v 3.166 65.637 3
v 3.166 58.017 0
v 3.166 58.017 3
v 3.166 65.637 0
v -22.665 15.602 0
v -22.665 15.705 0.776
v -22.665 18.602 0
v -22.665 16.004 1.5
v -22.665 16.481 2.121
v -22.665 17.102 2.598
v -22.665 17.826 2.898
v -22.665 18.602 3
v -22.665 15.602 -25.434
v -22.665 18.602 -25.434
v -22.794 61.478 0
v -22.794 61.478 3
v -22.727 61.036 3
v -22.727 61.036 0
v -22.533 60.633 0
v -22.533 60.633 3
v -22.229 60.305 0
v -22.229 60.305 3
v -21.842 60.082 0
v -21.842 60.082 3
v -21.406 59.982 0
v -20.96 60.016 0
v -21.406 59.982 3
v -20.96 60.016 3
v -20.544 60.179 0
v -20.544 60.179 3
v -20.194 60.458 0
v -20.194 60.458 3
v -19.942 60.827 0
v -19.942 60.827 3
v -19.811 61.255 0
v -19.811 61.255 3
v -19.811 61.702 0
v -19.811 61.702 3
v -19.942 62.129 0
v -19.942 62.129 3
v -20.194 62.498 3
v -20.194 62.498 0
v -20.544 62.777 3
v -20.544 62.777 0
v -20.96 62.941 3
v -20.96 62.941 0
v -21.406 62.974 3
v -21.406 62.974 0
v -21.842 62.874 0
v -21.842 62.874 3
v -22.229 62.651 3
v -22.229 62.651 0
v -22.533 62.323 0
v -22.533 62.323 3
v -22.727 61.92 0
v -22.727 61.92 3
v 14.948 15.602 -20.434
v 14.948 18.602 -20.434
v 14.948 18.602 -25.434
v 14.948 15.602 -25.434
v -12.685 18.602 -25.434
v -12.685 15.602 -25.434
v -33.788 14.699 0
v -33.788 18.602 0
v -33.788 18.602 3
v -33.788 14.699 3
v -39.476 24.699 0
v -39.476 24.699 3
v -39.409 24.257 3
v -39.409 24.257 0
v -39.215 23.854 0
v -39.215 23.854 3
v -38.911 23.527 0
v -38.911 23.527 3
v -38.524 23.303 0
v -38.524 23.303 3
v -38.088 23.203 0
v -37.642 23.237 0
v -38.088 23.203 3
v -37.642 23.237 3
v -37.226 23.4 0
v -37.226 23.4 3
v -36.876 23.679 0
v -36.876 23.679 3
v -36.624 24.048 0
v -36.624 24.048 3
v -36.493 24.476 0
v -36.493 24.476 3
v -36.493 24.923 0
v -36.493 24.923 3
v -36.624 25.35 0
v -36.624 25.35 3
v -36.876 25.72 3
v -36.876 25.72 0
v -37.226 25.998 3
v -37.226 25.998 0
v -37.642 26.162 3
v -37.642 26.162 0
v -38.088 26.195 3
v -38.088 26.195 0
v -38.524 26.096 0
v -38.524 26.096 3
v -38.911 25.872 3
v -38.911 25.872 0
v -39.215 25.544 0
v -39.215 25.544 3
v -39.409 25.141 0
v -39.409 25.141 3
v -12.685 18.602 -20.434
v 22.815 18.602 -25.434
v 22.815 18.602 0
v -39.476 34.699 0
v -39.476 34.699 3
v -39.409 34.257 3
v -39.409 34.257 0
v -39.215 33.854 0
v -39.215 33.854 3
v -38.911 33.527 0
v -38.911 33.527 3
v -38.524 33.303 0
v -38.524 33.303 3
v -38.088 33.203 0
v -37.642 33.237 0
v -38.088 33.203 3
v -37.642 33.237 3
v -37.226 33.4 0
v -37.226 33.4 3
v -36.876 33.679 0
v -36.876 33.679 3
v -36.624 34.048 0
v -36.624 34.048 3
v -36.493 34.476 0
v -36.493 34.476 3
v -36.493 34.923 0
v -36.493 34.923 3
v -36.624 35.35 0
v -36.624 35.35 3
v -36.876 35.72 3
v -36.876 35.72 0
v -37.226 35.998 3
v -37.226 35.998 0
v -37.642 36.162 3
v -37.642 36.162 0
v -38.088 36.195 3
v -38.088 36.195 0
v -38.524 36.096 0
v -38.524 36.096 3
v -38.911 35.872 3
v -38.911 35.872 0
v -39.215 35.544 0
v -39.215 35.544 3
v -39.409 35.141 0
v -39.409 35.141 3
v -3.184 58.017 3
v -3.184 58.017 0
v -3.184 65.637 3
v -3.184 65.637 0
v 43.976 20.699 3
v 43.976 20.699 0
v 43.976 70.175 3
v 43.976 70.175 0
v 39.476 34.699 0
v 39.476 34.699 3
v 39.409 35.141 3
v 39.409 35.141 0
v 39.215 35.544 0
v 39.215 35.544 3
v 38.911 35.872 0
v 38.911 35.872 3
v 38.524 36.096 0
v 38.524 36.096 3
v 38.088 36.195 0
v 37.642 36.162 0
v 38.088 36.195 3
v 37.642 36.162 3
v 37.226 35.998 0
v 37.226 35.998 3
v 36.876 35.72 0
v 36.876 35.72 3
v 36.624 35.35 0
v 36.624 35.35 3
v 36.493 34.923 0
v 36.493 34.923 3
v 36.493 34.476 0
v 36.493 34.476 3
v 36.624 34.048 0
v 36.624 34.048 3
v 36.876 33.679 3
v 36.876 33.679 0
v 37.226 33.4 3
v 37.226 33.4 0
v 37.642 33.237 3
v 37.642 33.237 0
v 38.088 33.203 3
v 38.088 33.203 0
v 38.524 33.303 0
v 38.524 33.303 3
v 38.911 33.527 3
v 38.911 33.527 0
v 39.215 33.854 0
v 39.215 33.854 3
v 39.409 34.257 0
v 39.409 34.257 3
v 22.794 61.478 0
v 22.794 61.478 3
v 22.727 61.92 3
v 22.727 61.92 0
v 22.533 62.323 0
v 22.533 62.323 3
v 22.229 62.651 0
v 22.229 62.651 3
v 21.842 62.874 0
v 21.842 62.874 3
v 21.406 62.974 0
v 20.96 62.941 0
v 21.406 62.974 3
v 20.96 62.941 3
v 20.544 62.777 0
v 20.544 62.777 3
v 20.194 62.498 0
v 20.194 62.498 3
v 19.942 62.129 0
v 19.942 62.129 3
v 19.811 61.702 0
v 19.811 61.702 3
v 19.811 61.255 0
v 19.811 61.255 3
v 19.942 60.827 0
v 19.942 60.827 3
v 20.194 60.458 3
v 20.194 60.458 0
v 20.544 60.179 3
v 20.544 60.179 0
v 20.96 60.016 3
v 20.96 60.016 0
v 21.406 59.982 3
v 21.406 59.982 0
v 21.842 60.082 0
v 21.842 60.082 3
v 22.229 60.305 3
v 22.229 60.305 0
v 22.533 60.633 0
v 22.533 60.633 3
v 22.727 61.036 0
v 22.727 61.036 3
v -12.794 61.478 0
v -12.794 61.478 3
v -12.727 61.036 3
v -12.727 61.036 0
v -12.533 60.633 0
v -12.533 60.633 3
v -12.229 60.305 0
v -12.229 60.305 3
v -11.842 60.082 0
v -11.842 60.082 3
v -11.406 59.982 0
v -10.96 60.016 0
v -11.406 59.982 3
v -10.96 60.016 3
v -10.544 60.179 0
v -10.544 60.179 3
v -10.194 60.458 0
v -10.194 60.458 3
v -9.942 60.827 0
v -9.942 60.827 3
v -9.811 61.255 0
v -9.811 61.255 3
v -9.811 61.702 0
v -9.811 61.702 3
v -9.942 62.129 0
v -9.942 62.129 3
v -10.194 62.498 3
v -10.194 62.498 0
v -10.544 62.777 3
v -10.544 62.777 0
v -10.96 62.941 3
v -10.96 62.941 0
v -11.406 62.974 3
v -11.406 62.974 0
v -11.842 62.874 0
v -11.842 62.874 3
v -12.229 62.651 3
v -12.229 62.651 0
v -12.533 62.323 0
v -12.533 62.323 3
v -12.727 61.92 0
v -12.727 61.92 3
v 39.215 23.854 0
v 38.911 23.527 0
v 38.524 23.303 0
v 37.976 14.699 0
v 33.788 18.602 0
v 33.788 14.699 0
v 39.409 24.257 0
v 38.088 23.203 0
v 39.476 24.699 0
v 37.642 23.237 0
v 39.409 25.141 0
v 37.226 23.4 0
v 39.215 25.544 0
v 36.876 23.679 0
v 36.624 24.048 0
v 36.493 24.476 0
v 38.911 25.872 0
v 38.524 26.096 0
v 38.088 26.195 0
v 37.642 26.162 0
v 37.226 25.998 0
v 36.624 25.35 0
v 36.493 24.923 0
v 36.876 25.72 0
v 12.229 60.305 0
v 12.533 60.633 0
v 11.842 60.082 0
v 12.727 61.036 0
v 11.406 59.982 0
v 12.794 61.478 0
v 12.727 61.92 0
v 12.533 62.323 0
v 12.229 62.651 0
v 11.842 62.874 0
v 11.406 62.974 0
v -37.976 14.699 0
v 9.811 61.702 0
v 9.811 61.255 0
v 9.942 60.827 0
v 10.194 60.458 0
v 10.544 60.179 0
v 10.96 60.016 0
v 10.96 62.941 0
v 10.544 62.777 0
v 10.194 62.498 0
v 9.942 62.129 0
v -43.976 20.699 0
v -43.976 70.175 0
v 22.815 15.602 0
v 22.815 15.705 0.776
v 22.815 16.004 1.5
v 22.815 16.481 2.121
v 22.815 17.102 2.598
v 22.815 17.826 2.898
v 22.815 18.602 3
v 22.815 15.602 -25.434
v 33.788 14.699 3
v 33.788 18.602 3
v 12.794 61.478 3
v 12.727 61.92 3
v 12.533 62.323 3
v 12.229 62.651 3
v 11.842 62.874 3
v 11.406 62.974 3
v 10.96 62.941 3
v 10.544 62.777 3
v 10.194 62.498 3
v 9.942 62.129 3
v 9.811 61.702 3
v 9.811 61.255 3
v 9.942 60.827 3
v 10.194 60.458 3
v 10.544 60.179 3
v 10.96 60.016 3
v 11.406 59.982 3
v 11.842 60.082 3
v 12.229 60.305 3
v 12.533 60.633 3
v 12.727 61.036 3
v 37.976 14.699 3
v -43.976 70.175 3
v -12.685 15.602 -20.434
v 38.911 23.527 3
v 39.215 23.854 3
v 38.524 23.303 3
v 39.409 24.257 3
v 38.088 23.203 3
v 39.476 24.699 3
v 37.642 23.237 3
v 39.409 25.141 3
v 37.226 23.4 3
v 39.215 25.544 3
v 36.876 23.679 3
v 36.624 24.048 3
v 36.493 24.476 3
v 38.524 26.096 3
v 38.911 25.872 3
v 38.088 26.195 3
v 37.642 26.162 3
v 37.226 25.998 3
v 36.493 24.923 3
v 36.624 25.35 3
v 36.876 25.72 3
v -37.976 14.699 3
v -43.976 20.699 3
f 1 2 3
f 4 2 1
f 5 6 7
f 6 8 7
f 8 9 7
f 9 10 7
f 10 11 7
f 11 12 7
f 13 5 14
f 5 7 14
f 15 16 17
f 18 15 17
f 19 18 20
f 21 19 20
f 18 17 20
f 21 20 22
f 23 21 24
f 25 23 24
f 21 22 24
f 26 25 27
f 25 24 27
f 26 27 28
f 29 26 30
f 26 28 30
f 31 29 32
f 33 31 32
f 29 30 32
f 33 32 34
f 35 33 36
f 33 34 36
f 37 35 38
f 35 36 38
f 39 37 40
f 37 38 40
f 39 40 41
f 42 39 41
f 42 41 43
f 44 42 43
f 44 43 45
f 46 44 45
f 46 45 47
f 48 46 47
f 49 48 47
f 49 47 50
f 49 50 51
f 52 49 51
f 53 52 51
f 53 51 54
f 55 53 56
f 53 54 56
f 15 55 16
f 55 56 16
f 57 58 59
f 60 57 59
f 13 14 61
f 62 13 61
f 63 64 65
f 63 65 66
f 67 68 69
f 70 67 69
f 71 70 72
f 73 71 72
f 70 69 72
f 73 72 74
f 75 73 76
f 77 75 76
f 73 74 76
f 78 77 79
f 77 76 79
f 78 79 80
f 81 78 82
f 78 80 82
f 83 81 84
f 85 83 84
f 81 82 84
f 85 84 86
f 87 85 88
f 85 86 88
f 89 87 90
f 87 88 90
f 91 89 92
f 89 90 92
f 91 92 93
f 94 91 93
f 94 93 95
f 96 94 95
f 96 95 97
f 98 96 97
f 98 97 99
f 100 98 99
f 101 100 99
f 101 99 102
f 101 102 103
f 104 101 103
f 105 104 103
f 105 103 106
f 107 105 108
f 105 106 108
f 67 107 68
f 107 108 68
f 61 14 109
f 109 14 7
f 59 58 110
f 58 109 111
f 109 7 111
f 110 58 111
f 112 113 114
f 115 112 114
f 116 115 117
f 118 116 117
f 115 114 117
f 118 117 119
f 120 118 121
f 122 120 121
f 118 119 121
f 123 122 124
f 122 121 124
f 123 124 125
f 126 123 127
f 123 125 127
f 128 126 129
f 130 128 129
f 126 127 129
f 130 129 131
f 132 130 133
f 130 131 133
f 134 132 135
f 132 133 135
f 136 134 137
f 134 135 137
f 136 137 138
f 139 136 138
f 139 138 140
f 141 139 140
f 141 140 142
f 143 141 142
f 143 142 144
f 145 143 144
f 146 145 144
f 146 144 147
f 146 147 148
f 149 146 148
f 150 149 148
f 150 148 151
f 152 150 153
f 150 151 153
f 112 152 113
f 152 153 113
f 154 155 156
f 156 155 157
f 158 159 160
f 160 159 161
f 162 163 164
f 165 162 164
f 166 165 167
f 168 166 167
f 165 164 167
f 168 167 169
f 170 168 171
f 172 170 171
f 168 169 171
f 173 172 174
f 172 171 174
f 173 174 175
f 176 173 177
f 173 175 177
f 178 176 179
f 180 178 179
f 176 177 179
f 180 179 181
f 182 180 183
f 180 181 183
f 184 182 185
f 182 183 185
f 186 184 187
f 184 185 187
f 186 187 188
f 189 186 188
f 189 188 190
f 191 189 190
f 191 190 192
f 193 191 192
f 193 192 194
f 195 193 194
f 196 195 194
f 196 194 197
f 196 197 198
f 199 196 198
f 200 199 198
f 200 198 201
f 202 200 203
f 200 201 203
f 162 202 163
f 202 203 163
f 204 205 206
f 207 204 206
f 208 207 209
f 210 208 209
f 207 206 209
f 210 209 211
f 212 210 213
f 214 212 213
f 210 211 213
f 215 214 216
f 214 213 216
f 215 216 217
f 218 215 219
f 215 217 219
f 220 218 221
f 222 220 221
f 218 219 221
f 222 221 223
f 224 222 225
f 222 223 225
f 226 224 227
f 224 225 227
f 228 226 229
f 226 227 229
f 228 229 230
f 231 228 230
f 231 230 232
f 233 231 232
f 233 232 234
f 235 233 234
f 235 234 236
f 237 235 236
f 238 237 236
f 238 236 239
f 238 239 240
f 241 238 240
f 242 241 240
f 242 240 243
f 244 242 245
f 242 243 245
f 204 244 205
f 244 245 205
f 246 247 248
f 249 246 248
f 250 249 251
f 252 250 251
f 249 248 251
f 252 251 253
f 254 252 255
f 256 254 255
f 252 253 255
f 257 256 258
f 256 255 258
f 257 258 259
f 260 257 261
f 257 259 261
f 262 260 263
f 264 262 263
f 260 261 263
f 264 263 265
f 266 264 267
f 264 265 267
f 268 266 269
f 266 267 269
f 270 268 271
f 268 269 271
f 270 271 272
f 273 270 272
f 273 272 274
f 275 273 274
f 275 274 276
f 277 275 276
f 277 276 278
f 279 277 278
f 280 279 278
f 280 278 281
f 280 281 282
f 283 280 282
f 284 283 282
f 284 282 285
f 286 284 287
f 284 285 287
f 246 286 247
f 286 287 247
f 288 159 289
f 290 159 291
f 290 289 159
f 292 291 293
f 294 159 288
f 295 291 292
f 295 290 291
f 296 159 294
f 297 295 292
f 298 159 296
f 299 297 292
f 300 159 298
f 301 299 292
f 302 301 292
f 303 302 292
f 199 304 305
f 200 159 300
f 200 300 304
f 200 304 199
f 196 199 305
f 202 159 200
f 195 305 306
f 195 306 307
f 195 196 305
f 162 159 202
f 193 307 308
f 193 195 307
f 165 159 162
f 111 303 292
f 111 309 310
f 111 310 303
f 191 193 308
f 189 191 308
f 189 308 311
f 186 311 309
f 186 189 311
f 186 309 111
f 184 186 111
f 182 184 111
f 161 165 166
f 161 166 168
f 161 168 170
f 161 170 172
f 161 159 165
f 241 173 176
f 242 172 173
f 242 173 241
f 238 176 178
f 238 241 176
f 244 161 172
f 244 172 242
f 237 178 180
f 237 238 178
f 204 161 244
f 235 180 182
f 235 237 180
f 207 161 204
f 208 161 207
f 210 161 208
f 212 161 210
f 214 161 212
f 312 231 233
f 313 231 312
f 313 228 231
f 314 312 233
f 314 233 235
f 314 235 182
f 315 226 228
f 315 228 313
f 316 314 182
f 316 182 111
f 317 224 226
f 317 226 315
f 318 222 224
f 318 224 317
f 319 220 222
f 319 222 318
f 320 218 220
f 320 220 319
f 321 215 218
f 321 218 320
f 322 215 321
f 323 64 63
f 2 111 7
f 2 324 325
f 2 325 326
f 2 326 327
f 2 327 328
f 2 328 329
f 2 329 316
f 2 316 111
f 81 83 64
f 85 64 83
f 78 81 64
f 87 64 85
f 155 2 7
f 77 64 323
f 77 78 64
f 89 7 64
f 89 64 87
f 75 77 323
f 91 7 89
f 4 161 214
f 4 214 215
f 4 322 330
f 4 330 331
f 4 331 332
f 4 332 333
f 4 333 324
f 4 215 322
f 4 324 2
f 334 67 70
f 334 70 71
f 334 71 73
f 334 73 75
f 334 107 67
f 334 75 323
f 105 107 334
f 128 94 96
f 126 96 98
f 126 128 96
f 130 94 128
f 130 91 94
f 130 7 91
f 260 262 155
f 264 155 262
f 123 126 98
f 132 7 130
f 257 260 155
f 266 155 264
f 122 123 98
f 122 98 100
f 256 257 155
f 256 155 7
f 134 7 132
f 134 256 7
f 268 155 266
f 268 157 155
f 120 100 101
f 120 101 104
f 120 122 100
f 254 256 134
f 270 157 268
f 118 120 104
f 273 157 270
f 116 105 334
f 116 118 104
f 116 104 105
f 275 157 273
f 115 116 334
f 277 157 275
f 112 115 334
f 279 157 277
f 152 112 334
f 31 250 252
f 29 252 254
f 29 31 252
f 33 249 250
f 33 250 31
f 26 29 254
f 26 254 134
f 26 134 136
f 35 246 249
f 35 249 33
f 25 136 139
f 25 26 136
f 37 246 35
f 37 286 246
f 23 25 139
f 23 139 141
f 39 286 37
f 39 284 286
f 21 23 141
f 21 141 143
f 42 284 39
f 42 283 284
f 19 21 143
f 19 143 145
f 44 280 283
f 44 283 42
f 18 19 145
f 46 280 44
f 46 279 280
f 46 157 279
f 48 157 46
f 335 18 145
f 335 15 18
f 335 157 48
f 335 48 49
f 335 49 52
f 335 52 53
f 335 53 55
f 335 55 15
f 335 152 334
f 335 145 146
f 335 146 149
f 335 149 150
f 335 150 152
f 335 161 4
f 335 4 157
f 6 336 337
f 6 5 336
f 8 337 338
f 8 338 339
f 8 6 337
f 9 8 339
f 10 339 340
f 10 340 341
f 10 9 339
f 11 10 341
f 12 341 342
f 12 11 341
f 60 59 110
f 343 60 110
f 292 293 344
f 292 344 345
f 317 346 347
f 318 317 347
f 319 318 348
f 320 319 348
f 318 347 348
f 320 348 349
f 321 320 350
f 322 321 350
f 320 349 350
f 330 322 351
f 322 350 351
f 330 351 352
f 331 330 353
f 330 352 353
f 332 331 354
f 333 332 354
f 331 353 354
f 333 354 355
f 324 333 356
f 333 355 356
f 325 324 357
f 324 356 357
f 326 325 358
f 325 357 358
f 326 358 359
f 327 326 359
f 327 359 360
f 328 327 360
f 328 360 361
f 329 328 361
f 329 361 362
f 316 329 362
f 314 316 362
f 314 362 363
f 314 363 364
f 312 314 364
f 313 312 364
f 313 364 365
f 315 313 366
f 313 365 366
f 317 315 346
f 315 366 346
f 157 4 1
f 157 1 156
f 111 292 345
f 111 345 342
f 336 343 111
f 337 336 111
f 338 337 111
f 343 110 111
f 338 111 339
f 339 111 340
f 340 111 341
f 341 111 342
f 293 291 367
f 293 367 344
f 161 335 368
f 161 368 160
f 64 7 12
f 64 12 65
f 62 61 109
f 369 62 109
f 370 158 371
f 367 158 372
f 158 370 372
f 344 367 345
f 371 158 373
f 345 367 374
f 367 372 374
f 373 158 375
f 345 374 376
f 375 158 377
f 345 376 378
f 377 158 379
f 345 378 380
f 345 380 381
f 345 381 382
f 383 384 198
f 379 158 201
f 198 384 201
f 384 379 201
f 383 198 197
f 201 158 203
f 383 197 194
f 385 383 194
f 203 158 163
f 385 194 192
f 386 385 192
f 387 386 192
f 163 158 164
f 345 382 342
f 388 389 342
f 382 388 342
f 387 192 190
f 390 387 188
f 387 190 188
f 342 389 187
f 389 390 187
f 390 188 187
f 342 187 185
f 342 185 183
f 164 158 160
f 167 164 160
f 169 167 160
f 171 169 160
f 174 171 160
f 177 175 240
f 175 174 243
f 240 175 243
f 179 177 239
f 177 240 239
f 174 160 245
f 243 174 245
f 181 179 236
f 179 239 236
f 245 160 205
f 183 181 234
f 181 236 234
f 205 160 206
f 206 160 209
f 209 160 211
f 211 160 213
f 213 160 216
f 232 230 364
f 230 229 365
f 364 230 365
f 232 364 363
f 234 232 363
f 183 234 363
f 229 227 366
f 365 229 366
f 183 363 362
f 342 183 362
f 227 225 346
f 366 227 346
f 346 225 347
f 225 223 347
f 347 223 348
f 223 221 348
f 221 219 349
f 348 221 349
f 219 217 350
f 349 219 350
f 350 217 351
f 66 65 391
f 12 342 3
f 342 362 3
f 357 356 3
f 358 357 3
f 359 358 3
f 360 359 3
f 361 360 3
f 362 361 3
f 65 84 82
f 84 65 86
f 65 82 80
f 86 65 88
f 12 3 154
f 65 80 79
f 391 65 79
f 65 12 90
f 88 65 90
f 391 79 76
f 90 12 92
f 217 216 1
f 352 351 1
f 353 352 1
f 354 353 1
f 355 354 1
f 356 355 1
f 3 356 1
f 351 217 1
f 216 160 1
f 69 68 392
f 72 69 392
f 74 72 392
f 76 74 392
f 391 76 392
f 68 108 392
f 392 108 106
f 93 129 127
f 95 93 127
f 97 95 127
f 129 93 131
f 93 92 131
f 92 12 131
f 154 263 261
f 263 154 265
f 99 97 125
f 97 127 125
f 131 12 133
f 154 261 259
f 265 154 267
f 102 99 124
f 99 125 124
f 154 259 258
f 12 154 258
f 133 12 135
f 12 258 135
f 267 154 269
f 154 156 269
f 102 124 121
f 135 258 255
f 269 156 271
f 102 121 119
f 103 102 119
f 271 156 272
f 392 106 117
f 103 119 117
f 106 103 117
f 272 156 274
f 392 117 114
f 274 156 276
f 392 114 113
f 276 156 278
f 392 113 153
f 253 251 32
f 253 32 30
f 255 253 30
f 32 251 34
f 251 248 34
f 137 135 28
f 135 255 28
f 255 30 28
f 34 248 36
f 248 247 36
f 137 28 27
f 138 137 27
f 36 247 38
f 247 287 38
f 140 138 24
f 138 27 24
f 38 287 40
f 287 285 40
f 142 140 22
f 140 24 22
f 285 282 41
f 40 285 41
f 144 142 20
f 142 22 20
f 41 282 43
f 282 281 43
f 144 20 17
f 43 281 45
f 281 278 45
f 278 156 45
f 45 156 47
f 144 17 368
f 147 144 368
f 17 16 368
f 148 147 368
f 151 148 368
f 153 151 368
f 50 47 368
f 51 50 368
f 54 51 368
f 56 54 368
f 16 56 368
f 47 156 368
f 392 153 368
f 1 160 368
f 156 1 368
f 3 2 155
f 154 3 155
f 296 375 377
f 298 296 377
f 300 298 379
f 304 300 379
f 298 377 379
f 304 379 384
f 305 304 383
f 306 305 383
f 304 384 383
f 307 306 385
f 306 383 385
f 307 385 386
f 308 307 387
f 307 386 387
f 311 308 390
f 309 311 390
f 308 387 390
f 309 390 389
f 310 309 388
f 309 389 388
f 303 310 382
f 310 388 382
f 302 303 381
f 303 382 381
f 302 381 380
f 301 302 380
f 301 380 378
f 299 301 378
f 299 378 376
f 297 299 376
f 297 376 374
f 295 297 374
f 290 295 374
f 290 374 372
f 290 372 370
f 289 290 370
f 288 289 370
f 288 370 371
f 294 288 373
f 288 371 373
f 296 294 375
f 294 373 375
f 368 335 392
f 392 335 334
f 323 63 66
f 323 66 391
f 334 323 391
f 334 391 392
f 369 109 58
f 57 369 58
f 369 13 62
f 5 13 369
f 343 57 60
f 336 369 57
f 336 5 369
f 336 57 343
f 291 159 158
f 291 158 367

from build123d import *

# Parameters (mm, degrees)
BOSS_EXTRUDE1_DEPTH = 3
SKETCH2_R           = 1.5
CUT_EXTRUDE1_DEPTH  = 3
SKETCH3_W           = 6.35
SKETCH3_H           = 7.620000001
CUT_EXTRUDE2_DEPTH  = 3
BOSS_EXTRUDE2_DEPTH = 3
FILLET2_R           = 3


with BuildPart() as part:
    # Sketch1 → Boss-Extrude1 (new body)
    with BuildSketch(Plane.XY):
        Polygon((-33.787864348, 18.602457347), (-33.787864348, 14.699262249), (-37.97594504, 14.699262249), (-43.97594504, 20.699262249), (-43.97594504, 28.455124303), (-43.97594504, 70.175124303), (43.97594504, 70.175124303), (43.97594504, 28.455124303), (43.97594504, 20.699262249), (37.97594504, 14.699262249), (33.787864348, 14.699262249), (33.787864348, 18.602457347), align=None)
    extrude(amount=BOSS_EXTRUDE1_DEPTH)

    # Sketch2 → Cut-Extrude1 (cut)
    with BuildSketch(Plane.XY.offset(3)):
        with Locations((37.97594504, 24.699262249)):
            Circle(SKETCH2_R)
        with Locations((37.97594504, 34.699262249)):
            Circle(SKETCH2_R)
        with Locations(Location((-37.97594504, 24.699262249, 0), (0, 0, 180))):
            Circle(SKETCH2_R)
        with Locations(Location((-37.97594504, 34.699262249, 0), (0, 0, 180))):
            Circle(SKETCH2_R)
        with Locations((21.293781262, 61.478152505)):
            Circle(SKETCH2_R)
        with Locations((11.293781262, 61.478152505)):
            Circle(SKETCH2_R)
        with Locations(Location((-11.293781262, 61.478152505, 0), (0, 0, 180))):
            Circle(SKETCH2_R)
        with Locations(Location((-21.293781262, 61.478152505, 0), (0, 0, 180))):
            Circle(SKETCH2_R)
    extrude(amount=-CUT_EXTRUDE1_DEPTH, mode=Mode.SUBTRACT)

    # Sketch3 → Cut-Extrude2 (cut)
    with BuildSketch(Plane(origin=(0, 0, 0), x_dir=(-1, 0, 0), z_dir=(0, 0, -1))):
        with Locations((0.00872995, 61.826506665)):
            Rectangle(SKETCH3_W, SKETCH3_H)
    extrude(amount=-CUT_EXTRUDE2_DEPTH, mode=Mode.SUBTRACT)

    # Sketch4 → Boss-Extrude2 (add)
    with BuildSketch(Plane.XZ.offset(-18.602457347)):
        Polygon((-12.685088164, -20.434120829), (14.947571964, -20.434120829), (14.947571964, -25.434120829), (22.815283287, -25.434120829), (22.815283287, 3), (-22.664716713, 3), (-22.664716713, -25.434120829), (-12.685088164, -25.434120829), align=None)
    extrude(amount=BOSS_EXTRUDE2_DEPTH)

    # Fillet2
    fillet2_edges = [part.edges().sort_by_distance(p)[0] for p in [
        (0.075283287, 15.602457347, 3),
    ]]
    fillet(fillet2_edges, radius=FILLET2_R)


solid = part.part
